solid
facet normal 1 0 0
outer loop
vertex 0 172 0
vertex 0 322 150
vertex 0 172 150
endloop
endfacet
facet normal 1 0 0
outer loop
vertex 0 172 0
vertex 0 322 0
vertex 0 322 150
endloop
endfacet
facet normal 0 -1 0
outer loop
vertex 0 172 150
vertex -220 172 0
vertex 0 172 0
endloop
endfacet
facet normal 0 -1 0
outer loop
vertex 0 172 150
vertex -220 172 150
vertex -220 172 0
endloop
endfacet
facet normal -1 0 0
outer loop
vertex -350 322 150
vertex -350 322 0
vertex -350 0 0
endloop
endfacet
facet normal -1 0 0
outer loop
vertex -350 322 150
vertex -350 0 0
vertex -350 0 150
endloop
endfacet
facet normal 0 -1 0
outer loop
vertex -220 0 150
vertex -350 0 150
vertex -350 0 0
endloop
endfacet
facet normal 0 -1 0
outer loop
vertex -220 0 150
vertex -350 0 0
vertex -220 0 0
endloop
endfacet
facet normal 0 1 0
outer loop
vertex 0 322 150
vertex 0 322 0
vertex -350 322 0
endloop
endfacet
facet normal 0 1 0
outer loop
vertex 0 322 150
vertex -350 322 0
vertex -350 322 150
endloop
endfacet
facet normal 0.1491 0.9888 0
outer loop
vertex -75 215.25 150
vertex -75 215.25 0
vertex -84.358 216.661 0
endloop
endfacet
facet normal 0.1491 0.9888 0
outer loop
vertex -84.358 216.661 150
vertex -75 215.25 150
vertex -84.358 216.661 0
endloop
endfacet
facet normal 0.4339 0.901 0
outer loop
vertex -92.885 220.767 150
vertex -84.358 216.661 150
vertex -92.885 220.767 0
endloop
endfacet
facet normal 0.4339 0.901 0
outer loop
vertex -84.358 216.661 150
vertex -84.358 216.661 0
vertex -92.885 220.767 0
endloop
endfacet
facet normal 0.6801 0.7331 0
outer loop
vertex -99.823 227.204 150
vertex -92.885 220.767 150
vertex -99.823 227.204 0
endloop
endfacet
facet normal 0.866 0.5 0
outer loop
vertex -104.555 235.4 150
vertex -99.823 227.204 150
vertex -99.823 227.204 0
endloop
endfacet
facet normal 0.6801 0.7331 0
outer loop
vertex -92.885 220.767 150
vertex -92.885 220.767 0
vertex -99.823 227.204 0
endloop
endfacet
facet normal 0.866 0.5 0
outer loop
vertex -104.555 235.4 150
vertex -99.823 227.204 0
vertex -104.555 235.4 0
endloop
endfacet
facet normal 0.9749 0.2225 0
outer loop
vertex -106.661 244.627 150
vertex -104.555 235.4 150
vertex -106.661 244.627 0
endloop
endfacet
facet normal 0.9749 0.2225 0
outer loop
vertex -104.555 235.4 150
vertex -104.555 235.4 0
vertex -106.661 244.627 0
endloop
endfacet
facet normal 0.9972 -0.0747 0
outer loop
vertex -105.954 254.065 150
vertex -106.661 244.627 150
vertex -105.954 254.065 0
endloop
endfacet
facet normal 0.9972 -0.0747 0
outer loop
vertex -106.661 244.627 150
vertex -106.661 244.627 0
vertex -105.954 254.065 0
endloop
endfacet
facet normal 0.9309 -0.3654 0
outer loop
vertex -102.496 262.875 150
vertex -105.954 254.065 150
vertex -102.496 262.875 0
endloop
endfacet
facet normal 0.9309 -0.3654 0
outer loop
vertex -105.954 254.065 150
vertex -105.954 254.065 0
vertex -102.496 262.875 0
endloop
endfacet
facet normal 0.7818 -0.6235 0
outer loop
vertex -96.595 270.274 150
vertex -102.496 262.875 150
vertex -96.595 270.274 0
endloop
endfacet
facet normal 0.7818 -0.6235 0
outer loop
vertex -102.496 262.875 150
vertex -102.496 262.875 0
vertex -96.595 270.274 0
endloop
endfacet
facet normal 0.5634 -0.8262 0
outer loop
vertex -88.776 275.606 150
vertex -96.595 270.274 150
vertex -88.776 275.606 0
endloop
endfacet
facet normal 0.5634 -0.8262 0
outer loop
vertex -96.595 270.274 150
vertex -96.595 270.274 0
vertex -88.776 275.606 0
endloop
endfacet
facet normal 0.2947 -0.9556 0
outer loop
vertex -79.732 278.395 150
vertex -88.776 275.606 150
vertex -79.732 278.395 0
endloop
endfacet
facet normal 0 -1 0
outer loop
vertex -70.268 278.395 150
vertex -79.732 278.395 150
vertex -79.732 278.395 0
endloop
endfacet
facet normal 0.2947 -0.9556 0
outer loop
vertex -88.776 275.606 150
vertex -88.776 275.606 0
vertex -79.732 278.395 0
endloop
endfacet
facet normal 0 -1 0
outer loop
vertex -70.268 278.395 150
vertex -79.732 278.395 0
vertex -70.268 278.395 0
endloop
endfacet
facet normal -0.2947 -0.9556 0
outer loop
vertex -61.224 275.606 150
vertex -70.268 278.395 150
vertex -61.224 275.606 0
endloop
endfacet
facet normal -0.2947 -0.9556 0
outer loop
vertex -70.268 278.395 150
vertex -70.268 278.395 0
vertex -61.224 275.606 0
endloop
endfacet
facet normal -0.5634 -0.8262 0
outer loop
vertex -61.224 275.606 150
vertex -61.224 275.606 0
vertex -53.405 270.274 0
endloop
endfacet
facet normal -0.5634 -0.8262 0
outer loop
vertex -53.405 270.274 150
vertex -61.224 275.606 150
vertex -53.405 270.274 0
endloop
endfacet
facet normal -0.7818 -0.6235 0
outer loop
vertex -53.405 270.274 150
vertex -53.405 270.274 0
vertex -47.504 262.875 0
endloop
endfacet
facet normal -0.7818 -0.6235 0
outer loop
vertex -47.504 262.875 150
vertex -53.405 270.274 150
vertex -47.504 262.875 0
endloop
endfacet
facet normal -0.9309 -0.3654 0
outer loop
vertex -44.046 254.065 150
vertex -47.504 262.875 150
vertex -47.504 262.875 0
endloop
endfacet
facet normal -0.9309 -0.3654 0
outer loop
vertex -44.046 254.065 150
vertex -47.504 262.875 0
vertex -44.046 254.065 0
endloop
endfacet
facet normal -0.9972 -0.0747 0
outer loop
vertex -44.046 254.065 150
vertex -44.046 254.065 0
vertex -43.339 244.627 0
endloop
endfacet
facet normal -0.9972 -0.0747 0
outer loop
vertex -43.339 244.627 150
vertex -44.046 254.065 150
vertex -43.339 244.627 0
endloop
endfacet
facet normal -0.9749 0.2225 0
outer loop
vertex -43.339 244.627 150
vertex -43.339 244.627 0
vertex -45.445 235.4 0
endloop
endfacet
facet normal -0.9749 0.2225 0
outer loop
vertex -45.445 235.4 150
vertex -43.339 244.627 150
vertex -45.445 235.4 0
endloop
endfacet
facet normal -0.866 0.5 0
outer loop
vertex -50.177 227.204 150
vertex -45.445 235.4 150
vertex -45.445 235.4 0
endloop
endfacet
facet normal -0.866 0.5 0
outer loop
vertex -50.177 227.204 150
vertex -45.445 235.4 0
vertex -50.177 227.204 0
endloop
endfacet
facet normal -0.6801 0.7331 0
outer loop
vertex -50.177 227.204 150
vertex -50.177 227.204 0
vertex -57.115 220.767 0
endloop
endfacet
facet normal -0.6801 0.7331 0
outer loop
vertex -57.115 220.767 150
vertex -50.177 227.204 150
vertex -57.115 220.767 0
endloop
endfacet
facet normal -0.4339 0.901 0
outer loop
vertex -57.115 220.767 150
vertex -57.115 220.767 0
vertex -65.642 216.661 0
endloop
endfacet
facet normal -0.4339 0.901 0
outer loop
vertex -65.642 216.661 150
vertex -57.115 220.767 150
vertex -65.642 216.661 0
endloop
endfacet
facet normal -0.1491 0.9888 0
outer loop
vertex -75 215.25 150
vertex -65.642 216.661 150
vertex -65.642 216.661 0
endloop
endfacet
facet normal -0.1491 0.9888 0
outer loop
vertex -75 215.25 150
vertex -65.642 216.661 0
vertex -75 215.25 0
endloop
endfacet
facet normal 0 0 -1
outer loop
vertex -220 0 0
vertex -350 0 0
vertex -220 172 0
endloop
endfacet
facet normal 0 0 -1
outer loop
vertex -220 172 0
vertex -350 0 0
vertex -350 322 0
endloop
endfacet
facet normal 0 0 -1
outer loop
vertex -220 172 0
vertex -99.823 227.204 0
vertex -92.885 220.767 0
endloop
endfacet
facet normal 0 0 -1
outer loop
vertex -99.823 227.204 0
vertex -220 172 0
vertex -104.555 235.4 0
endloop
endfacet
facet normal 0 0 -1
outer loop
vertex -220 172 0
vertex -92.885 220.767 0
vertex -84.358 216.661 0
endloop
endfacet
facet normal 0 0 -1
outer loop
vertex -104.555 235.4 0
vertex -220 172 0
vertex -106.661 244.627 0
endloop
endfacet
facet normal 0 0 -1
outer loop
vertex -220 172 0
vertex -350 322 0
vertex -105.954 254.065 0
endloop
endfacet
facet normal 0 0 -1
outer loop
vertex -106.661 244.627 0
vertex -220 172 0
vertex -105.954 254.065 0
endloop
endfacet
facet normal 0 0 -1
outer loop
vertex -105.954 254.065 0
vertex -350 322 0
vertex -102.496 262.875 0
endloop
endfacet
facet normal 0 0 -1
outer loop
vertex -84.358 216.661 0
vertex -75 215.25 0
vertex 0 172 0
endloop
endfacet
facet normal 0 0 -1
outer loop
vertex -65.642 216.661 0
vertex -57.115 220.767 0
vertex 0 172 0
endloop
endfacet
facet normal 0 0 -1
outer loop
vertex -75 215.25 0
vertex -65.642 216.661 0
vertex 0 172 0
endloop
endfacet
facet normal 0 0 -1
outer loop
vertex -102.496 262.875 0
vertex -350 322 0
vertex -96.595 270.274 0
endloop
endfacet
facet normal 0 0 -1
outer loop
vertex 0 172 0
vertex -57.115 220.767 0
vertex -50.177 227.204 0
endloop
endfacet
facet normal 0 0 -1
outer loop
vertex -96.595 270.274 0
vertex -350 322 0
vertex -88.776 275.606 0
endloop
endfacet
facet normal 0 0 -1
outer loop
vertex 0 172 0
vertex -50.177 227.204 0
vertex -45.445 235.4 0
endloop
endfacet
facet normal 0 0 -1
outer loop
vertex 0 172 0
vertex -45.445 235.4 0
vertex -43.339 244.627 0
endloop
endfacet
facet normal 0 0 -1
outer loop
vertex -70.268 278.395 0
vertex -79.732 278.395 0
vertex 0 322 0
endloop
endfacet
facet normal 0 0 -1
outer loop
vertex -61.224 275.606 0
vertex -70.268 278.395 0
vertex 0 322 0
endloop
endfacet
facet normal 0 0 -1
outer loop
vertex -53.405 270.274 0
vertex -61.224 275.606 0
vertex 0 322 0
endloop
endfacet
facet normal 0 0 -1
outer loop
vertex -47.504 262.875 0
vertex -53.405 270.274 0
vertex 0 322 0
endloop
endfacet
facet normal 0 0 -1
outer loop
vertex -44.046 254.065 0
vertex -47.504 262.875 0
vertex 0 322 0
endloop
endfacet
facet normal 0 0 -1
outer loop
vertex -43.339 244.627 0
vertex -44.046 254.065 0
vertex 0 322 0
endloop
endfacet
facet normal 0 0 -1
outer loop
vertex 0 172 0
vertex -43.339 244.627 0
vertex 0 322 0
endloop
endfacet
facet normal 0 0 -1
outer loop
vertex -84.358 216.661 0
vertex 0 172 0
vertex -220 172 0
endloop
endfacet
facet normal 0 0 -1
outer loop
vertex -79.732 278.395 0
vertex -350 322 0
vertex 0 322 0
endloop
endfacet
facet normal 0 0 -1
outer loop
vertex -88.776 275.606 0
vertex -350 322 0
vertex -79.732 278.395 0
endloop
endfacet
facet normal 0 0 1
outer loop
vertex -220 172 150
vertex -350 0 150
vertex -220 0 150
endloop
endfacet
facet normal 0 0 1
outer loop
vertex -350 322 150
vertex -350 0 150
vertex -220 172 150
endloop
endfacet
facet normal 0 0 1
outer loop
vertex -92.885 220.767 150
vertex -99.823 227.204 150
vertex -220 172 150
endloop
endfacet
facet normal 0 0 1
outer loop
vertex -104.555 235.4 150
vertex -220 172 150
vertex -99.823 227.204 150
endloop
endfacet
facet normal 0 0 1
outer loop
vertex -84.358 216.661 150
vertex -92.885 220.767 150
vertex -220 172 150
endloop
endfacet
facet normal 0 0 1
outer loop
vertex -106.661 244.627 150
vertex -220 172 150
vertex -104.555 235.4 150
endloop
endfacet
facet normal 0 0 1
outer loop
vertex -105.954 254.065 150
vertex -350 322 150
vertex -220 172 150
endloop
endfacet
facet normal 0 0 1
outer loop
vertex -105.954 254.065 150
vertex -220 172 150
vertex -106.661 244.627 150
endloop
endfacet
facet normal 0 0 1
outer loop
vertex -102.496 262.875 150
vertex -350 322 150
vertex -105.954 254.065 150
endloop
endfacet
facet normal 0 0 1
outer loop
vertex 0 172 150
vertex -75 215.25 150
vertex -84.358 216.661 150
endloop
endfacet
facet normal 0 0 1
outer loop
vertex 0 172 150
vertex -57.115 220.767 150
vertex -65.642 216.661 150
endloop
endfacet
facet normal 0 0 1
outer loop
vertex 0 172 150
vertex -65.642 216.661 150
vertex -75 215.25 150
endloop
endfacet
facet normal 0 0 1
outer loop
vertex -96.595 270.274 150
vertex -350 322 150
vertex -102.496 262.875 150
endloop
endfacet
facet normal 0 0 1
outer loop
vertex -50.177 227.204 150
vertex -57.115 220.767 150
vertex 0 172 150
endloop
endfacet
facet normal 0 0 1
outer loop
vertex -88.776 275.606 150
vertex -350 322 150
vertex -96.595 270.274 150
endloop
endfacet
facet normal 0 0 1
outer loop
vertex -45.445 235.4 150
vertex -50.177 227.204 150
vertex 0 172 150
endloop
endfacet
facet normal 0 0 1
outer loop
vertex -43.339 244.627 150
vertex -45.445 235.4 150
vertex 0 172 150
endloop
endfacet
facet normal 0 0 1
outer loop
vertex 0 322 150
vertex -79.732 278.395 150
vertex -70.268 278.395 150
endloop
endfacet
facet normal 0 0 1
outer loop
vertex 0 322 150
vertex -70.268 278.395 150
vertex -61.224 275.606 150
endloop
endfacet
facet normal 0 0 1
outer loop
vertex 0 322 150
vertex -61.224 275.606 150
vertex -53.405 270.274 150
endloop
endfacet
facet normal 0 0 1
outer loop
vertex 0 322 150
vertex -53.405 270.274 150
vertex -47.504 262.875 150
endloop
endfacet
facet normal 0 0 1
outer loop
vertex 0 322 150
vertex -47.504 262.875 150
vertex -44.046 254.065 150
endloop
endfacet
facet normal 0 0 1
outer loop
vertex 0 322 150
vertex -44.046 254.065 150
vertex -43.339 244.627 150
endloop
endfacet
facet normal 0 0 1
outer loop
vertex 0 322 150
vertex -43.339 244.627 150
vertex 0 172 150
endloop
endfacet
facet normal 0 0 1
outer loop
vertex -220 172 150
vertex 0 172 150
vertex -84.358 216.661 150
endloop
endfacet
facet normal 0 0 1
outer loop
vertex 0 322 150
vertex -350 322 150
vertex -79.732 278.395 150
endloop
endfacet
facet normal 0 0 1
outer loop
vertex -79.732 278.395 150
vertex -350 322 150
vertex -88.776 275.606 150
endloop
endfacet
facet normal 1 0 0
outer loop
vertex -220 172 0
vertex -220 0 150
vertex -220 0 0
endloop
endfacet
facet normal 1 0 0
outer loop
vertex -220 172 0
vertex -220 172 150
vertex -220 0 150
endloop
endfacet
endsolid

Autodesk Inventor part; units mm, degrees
ref_plane "YZ Plane" through (0, 0, 0) normal (1, 0, 0) x (0, 1, 0)
ref_plane "XZ Plane" through (0, 0, 0) normal (0, 1, 0) x (-1, 0, 0)
ref_plane "XY Plane" through (0, 0, 0) normal (0, 0, 1) x (1, 0, 0)
sketch "Sketch1" plane through (0, 0, 0) normal (0, 0, 1) x (1, 0, 0)
  line L0 (-150, 322) -> (0, 322)
  line L1 (0, 322) -> (0, 0)
  line L2 (0, 0) -> (-150, 0)
  line L3 (-150, 0) -> (-150, 322)
  dimension "d0" = 150
  dimension "d1" = 322
extrude "Extrusion1" add sketch "Sketch1" along normal blind 150
sketch "Sketch2" plane through (0, 0, 150) normal (0, 0, 1) x (1, 0, 0)
  line L0 (0, 0) -> (0, 322) projected
  line L1 (0, 322) -> (-150, 322) projected
  point P0 (-75, 247)
  dimension "d4" = 75
  dimension "d5" = 75
hole "Hole1" at (-75, 247, 150) direction (0, 0, -1) diameter 63.5 end through all
sketch "Sketch3" plane through (-150, 0, 0) normal (-1, 0, 0) x (0, 0, 1)
  line L0 (0, 0) -> (0, 322) projected
  line L1 (150, 322) -> (150, 0) projected
  line L2 (0, 322) -> (150, 322)
  line L3 (150, 322) -> (150, 172)
  line L4 (150, 172) -> (0, 172)
  line L5 (0, 172) -> (0, 322)
  dimension "d13" = 150
extrude "Extrusion2" add sketch "Sketch3" along normal blind 200
sketch "Sketch4" plane through (-150, 0, 0) normal (0, -1, 0) x (1, 0, 0)
  line L0 (150, 0) -> (0, 0) projected
  line L1 (0, 150) -> (150, 150) projected
  line L2 (0, 0) -> (150, 0)
  line L3 (150, 0) -> (150, 150)
  line L4 (150, 150) -> (0, 150)
  line L5 (0, 150) -> (0, 0)
extrude "Extrusion3" cut sketch "Sketch4" against normal blind 172
sketch "Sketch5" plane through (-350, 172, 150) normal (0, -1, 0) x (1, 0, 0)
  line L0 (0, -150) -> (0, 0) projected
  line L1 (0, -150) -> (350, -150) projected
  line L2 (0, 0) -> (130, 0)
  line L3 (130, 0) -> (130, -150)
  line L4 (130, -150) -> (0, -150)
  line L5 (0, -150) -> (0, 0)
  dimension "d18" = 130
extrude "Extrusion4" add sketch "Sketch5" along normal blind 172
properties part number "stand"
